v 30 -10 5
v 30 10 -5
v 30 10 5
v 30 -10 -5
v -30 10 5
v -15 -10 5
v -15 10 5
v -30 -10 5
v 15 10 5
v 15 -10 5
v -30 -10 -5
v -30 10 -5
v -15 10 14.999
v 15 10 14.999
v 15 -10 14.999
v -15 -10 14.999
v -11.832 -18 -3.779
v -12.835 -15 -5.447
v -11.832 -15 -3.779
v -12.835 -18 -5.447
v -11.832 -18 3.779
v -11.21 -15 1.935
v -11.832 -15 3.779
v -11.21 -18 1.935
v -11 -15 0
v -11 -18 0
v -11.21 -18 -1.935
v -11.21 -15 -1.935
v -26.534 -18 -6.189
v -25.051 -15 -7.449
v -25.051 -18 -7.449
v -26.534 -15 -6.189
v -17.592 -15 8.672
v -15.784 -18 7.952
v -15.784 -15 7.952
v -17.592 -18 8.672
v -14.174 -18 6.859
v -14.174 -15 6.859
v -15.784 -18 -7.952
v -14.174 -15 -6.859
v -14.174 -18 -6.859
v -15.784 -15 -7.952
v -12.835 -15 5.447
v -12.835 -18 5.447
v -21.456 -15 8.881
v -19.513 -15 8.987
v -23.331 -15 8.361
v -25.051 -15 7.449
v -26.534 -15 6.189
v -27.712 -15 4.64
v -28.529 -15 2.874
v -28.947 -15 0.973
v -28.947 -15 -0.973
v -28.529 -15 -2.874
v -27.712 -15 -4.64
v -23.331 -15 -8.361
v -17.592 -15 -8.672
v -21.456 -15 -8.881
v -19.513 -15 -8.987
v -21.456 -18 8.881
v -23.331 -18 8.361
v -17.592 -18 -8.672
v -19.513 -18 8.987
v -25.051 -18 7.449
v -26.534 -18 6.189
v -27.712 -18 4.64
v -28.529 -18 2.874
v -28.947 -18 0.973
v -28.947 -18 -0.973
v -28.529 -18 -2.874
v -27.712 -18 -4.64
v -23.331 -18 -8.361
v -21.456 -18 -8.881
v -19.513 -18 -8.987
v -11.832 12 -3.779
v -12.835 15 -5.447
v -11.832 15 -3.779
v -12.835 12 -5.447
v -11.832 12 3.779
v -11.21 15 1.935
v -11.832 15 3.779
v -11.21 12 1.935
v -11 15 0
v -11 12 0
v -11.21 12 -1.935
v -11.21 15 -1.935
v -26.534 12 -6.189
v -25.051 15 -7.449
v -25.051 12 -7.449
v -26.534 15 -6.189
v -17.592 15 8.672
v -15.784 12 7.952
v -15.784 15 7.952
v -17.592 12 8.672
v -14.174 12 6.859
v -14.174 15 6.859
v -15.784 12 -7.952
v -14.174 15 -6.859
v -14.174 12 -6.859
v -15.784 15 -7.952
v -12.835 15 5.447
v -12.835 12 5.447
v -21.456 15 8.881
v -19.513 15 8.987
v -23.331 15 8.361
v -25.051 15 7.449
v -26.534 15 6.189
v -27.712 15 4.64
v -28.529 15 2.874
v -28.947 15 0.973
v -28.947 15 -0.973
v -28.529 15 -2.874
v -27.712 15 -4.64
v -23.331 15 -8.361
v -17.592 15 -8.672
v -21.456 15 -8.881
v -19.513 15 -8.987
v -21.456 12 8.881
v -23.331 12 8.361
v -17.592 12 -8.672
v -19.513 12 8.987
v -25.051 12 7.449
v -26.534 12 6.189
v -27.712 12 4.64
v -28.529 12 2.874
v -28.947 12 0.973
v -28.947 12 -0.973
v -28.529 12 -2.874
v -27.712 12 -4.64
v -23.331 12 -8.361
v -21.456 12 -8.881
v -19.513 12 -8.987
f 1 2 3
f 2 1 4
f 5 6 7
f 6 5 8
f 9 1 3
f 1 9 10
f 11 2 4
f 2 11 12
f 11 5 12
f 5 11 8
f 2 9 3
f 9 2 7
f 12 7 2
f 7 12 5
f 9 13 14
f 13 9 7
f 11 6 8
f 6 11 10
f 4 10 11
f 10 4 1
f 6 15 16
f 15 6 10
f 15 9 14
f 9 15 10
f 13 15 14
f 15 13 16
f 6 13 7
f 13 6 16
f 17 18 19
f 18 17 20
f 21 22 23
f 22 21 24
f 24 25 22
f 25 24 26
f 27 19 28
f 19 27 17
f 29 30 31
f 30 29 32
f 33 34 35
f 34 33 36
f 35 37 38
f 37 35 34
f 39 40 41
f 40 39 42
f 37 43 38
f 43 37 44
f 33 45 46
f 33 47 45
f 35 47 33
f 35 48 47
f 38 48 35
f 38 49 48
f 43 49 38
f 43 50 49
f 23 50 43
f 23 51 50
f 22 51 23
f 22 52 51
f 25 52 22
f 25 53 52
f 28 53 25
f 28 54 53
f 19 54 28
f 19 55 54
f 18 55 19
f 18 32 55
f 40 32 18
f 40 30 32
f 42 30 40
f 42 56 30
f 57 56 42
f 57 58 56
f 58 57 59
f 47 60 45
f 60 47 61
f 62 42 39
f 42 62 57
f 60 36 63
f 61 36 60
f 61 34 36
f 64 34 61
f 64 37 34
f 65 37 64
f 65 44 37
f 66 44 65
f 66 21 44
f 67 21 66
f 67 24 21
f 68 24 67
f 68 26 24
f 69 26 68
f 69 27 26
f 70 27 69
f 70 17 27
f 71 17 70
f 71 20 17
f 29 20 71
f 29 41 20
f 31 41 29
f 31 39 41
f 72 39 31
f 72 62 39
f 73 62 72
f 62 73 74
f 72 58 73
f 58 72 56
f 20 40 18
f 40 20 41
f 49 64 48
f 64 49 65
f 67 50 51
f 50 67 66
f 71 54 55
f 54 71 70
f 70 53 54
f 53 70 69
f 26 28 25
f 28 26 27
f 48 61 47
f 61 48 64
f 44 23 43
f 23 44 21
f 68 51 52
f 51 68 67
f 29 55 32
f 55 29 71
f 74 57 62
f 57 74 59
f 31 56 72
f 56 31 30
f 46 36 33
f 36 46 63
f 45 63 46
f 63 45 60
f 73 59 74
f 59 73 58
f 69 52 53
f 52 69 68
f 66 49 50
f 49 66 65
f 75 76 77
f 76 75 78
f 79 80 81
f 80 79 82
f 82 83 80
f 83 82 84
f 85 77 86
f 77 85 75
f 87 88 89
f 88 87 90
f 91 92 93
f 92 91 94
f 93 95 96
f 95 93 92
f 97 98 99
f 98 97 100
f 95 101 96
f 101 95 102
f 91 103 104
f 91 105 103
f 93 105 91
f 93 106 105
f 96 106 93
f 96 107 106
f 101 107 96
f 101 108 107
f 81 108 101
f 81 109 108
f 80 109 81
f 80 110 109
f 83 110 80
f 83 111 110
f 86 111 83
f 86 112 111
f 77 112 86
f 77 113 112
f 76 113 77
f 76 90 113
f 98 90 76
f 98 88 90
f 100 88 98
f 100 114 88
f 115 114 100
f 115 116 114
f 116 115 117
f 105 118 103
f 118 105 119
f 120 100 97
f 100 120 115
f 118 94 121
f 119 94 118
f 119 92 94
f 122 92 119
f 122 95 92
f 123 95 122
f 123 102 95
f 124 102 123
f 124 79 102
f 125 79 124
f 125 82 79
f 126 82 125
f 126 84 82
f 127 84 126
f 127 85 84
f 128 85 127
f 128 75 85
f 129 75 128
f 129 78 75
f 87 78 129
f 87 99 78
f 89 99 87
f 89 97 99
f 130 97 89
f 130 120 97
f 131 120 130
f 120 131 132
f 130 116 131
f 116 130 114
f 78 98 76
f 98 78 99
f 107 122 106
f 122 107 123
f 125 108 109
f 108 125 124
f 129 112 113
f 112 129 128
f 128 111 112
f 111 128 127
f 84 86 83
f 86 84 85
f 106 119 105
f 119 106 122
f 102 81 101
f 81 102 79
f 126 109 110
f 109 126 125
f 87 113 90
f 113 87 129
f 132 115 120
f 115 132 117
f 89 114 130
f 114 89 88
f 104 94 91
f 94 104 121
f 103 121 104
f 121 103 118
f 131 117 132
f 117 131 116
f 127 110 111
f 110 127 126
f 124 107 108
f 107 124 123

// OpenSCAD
cube([60,20,10],center=true);
translate([0,0,10-0.001])
    cube([30,20,10],center=true);
// left front wheel
translate([-20,-15,0])
rotate([90,0,0])
    cylinder(h=3, r=9);
    
// right front wheel
translate([-20,15,0])
rotate([90,0,0])
    cylinder(h=3, r=9);
